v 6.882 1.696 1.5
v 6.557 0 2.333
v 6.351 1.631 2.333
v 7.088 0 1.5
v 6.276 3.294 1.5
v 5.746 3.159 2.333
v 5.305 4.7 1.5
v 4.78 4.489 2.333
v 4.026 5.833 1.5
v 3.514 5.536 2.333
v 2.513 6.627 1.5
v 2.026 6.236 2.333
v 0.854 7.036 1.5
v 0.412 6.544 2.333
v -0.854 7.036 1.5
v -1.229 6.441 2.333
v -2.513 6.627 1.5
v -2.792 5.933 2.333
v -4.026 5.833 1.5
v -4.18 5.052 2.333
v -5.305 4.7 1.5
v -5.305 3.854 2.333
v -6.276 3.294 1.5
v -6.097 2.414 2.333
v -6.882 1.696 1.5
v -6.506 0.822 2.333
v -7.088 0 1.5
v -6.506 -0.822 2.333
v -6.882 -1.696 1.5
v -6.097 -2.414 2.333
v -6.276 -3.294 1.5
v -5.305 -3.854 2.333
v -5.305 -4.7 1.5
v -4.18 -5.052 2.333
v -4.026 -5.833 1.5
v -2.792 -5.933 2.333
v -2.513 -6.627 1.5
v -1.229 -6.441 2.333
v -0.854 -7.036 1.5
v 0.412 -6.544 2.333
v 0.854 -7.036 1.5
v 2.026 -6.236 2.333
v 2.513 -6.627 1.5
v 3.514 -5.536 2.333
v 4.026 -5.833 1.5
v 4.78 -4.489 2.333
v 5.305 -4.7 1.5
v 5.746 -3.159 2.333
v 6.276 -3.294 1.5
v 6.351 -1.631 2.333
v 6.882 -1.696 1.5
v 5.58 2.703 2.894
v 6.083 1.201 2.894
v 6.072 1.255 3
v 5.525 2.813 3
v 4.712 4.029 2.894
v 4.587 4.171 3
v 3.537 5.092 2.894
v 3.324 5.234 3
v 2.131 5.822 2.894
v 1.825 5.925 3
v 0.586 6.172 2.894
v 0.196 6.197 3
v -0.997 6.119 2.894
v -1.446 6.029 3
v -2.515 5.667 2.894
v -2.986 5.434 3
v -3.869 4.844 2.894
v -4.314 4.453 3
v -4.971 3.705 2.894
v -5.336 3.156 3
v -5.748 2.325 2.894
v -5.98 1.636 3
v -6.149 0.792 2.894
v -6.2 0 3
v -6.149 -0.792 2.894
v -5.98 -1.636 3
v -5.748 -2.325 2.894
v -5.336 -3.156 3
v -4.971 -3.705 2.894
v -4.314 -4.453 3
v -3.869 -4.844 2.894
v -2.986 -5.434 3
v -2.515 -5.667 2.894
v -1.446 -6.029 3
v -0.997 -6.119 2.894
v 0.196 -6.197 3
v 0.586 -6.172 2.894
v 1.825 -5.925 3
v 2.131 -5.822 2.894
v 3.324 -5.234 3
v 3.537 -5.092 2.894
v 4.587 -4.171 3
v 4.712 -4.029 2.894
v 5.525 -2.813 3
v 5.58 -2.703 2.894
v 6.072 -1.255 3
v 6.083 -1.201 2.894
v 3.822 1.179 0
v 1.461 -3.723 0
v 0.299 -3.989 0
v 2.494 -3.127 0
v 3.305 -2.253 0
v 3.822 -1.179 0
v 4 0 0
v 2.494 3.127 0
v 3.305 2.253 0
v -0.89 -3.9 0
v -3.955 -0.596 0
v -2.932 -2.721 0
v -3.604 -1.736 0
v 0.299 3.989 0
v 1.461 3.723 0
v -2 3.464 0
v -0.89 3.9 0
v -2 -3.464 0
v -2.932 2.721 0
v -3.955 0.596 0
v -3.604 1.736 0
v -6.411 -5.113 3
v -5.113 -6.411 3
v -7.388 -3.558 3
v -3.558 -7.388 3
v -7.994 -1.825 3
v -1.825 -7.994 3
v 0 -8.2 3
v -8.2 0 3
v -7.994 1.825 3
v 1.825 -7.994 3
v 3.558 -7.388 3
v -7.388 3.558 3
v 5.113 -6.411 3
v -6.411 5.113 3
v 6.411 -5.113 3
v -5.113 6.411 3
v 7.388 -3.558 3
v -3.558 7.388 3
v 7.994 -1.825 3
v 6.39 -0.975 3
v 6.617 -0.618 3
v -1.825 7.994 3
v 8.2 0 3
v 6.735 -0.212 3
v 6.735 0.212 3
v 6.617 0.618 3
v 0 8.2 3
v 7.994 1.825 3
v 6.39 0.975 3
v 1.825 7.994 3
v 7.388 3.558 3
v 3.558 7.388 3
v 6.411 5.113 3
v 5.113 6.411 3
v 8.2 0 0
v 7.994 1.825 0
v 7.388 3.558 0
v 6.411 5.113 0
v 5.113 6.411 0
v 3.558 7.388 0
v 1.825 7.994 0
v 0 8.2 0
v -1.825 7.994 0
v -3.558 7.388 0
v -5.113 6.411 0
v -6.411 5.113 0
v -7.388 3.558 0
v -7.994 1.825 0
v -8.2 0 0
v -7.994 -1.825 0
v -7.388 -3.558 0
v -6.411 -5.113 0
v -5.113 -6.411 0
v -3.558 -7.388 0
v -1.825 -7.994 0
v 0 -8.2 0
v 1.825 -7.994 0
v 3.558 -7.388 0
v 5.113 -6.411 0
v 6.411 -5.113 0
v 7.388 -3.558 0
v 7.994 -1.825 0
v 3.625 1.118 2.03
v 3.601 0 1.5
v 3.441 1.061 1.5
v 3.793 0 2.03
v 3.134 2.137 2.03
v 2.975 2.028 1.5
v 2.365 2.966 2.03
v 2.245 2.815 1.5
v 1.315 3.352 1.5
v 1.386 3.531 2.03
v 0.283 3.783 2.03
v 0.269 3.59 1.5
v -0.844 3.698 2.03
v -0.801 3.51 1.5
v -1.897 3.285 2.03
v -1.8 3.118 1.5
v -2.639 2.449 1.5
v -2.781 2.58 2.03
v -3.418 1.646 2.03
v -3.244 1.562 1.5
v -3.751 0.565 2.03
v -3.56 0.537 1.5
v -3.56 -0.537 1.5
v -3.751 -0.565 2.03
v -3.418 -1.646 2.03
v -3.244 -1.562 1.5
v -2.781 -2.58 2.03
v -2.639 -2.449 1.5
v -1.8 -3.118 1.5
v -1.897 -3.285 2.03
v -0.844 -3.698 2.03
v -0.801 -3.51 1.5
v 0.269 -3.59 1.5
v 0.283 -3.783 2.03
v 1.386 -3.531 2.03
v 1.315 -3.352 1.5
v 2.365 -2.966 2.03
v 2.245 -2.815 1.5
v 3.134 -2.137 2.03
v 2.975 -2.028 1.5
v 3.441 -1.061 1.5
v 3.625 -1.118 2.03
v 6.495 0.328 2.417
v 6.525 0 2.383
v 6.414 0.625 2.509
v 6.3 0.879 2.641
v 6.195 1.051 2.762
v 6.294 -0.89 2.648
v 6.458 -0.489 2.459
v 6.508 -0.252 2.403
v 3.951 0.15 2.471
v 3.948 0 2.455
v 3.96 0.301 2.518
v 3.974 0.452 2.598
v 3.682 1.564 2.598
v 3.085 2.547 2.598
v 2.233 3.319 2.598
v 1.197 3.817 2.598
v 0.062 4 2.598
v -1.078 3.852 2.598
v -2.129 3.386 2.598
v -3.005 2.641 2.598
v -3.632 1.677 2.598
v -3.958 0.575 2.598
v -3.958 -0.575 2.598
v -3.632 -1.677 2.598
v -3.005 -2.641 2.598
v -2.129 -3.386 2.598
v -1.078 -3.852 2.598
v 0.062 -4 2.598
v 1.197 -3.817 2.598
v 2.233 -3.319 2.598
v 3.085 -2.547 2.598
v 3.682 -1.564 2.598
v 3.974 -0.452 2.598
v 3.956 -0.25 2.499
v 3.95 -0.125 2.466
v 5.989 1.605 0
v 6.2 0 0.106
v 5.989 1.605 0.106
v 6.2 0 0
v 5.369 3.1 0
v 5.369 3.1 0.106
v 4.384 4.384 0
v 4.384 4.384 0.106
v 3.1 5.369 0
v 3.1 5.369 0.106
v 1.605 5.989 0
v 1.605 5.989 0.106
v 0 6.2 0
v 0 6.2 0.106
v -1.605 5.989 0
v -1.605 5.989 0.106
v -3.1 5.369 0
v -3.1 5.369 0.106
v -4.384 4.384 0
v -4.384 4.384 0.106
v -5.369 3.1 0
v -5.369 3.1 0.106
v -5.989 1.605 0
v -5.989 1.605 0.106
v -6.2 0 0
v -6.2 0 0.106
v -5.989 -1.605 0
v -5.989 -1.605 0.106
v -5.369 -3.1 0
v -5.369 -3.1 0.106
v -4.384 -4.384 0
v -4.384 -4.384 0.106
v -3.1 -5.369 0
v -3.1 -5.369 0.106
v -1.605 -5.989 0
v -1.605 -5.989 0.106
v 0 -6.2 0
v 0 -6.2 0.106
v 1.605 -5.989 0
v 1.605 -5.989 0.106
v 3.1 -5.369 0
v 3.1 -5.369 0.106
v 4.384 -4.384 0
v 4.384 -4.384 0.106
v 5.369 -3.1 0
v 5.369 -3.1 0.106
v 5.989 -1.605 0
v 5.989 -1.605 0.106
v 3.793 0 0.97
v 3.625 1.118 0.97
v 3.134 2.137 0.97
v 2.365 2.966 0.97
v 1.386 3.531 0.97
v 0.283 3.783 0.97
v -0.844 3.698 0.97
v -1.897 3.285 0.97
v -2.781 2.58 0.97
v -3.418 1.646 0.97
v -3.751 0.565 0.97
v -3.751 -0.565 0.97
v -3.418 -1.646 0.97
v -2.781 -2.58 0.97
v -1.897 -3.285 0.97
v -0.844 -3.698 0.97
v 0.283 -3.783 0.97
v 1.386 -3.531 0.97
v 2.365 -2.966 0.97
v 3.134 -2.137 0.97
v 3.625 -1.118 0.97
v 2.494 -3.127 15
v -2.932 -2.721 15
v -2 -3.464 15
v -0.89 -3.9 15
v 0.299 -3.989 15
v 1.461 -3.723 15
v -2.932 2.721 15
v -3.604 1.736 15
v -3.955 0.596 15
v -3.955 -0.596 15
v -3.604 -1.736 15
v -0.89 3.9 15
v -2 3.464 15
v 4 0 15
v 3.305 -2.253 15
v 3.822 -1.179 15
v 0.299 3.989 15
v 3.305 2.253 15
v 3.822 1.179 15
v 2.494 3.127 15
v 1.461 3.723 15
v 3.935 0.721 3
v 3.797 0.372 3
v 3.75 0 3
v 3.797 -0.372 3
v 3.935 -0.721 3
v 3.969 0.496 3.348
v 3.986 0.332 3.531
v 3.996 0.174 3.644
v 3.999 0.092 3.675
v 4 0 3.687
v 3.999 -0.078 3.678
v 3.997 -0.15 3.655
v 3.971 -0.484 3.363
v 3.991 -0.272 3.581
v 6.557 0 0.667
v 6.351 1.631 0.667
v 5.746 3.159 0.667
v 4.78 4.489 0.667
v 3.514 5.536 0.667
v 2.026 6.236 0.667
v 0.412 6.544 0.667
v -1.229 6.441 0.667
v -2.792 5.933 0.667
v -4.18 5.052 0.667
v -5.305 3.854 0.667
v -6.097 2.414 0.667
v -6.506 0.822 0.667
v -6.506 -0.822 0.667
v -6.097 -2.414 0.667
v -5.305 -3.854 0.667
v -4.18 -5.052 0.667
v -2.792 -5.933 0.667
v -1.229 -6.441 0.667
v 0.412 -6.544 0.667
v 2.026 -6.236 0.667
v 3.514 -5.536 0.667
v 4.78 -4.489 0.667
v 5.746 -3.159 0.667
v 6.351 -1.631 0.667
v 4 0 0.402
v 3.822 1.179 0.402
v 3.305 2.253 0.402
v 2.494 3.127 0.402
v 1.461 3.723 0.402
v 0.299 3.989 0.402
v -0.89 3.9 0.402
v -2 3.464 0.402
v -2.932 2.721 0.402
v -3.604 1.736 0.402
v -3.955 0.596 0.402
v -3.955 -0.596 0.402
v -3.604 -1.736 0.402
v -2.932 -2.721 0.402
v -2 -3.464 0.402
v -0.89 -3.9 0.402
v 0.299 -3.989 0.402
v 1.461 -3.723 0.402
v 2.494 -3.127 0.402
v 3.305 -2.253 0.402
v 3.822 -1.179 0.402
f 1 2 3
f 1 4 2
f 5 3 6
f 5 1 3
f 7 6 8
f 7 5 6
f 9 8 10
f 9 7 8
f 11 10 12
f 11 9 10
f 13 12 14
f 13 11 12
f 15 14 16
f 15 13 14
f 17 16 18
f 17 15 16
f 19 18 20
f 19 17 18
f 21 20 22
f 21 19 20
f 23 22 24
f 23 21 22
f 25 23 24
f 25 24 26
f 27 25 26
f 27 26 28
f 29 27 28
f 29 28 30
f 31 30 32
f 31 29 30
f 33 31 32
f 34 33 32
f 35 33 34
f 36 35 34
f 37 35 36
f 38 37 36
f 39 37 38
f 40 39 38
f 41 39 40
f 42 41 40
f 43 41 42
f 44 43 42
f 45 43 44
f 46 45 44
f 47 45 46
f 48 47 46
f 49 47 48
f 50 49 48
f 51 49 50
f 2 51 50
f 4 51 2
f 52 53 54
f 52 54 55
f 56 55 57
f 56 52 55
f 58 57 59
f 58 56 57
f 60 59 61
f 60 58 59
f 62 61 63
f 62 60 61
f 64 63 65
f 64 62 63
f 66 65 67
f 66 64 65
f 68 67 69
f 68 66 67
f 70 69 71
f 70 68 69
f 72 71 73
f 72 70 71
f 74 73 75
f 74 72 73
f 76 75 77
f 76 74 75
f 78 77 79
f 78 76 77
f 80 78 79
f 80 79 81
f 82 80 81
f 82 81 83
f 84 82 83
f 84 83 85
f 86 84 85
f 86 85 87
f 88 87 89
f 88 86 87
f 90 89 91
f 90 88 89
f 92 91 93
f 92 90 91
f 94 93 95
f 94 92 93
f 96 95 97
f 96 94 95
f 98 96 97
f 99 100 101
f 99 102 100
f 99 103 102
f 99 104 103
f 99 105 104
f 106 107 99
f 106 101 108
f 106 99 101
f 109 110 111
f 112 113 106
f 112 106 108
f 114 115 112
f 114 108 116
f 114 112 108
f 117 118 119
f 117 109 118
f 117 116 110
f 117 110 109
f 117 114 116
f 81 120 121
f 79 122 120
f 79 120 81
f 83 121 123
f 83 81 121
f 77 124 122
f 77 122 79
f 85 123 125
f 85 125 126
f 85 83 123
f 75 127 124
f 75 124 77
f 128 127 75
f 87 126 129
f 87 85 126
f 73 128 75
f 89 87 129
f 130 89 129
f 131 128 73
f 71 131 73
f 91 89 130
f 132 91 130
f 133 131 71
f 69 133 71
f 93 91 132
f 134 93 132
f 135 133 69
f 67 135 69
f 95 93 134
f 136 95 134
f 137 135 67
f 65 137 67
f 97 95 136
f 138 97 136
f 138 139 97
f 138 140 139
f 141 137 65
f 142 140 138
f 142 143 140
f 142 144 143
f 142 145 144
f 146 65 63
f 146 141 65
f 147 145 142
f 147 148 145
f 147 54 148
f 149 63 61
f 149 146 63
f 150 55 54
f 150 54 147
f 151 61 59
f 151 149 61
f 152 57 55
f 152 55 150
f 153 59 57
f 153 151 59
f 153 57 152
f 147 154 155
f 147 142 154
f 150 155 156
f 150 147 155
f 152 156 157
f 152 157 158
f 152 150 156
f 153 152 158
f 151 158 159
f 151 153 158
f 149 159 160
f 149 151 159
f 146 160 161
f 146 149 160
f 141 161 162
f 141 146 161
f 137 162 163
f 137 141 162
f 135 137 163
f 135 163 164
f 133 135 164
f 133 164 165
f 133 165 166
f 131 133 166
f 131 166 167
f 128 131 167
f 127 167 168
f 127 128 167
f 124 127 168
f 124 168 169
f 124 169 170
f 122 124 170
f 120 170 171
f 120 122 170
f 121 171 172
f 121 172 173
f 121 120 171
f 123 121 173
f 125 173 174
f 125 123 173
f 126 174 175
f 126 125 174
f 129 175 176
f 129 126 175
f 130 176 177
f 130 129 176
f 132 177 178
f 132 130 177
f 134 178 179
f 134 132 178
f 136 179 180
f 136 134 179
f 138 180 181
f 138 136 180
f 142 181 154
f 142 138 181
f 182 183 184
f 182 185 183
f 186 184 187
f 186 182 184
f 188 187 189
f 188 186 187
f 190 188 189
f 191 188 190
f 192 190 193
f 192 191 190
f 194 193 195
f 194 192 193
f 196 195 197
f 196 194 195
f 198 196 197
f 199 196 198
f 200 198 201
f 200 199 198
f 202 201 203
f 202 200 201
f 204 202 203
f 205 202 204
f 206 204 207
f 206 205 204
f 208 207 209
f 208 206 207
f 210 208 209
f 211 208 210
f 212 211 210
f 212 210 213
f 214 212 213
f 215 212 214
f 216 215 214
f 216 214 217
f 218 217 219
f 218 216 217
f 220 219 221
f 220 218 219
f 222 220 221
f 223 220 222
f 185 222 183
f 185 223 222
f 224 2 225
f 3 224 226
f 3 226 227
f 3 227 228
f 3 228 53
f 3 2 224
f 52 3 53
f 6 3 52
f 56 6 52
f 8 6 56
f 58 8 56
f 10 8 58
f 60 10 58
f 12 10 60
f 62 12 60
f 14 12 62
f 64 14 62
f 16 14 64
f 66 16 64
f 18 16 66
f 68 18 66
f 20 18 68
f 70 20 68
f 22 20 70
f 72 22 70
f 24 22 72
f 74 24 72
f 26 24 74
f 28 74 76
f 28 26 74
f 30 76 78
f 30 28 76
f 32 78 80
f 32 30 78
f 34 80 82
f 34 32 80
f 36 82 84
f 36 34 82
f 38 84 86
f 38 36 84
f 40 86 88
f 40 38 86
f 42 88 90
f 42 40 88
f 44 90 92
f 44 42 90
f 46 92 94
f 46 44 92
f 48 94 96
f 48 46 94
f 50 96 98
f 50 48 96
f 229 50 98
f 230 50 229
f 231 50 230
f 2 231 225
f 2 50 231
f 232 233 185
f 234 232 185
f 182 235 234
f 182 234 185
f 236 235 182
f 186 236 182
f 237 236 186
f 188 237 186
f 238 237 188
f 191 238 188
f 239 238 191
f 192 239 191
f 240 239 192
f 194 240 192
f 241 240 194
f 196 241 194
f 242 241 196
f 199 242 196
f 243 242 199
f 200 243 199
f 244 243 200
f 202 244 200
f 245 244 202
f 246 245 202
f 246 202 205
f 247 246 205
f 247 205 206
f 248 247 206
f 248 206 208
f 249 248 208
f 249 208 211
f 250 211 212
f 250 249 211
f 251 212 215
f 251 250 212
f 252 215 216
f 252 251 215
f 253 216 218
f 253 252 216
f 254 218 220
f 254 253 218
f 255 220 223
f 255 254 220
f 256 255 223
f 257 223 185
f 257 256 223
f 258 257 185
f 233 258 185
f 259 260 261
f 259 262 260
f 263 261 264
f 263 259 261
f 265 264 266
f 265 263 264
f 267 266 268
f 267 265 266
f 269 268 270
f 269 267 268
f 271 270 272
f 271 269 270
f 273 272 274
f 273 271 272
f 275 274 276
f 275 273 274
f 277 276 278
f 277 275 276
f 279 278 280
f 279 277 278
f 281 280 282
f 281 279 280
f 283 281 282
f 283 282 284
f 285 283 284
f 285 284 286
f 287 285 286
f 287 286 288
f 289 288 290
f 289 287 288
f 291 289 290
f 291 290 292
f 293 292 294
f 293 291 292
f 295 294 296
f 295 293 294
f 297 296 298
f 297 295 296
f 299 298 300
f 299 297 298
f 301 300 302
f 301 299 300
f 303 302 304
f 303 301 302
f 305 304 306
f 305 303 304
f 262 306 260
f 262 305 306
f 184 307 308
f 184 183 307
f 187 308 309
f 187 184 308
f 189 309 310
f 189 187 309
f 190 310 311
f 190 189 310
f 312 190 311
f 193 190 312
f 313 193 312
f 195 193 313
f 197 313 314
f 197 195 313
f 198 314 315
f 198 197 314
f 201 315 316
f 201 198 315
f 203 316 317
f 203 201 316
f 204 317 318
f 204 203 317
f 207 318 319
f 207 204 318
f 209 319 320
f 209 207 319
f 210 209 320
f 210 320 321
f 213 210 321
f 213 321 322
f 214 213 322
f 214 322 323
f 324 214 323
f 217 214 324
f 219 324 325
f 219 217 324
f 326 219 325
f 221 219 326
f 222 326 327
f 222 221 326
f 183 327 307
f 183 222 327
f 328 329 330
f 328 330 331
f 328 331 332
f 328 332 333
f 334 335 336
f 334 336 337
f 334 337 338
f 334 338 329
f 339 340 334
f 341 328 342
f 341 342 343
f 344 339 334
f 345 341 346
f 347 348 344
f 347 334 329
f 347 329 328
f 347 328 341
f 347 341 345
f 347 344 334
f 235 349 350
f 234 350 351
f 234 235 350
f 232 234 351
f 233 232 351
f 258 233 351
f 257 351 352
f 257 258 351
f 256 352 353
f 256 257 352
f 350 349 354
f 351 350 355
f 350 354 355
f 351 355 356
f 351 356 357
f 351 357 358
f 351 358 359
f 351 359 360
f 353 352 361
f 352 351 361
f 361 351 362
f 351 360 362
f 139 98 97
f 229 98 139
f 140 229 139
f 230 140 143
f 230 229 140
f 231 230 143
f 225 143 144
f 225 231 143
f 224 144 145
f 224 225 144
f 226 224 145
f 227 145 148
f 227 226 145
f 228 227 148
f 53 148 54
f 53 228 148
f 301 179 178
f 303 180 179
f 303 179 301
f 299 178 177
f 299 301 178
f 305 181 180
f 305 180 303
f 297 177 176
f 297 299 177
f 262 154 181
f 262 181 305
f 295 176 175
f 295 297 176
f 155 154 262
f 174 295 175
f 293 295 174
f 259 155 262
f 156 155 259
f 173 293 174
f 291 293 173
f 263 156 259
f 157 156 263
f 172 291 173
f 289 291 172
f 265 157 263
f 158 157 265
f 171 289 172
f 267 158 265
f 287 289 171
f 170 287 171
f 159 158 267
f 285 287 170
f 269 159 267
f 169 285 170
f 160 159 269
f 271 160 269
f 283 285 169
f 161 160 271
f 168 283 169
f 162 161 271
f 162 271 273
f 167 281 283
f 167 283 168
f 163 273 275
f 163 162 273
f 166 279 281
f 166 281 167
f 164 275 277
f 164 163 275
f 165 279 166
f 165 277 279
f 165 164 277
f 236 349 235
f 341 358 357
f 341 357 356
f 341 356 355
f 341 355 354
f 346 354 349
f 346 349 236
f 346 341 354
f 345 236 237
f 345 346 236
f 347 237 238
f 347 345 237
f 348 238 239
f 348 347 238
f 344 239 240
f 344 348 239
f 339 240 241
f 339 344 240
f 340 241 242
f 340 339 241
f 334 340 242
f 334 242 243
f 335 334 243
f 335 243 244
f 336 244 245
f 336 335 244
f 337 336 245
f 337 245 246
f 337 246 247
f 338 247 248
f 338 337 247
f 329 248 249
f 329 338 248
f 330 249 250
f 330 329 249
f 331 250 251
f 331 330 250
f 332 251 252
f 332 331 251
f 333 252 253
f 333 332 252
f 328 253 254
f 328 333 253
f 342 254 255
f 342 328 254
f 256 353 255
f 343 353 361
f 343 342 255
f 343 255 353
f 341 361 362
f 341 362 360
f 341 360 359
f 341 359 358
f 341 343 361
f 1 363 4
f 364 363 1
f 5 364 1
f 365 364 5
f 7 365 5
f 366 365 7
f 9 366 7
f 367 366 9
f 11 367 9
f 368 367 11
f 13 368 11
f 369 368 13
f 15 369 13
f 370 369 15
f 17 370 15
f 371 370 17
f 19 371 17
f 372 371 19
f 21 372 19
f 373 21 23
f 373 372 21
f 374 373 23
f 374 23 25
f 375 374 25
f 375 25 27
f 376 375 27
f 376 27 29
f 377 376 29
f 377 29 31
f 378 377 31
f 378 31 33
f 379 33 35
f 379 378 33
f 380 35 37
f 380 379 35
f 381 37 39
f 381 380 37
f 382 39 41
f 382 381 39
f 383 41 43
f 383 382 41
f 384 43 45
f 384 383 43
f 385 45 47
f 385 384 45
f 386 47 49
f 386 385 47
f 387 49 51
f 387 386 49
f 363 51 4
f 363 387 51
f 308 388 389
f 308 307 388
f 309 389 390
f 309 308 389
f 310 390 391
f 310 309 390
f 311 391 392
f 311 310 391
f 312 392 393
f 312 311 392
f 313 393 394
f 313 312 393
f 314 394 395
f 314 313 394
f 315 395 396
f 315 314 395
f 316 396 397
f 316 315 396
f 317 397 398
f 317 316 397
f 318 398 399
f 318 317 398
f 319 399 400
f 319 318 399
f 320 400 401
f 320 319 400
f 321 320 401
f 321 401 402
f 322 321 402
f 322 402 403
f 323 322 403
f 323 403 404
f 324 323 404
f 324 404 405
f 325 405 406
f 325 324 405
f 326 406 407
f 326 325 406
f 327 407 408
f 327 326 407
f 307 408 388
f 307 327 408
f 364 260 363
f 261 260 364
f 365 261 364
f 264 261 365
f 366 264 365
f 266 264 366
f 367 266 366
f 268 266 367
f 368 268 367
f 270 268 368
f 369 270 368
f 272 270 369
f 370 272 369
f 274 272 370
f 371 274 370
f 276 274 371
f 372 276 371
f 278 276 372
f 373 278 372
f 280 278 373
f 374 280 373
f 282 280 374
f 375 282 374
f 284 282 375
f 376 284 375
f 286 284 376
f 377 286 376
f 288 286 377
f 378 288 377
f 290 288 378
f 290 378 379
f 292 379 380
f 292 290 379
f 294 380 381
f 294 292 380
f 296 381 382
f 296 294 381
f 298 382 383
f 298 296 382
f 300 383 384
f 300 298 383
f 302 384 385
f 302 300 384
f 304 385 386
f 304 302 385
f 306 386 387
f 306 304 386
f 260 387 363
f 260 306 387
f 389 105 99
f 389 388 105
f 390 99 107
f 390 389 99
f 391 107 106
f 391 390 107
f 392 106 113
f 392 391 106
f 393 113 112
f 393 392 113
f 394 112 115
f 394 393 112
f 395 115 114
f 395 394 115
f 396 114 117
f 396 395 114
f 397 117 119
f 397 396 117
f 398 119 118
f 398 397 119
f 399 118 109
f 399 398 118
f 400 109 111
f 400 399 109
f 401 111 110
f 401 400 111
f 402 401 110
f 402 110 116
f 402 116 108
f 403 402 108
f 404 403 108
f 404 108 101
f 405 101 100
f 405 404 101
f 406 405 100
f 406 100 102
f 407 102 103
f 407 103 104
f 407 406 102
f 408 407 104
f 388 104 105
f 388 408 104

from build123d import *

# Parameters (mm, degrees)
F2_R     = 1.5
F3_DEPTH = 1.5
F3_TAPER = 20


with BuildPart() as f1:
    # F0 (on Front) → F1 (revolve)
    with BuildSketch(Plane.XZ):
        Polygon((0, 15), (0, 0), (4, 0), (4, 0.4024499541), (3.7934764173, 0.9698688341), (3.6005244527, 1.5), (3.7934764478, 2.0301312496), (4, 2.5975500459), (4, 15), align=None)
    revolve(axis=Axis((0, 0, 7.5), (0, 0, 1)))


with BuildPart() as f1b:
    # F0 (on Front) → F1, piece 2 (revolve)
    with BuildSketch(Plane.XZ):
        Polygon((6.5572567367, 0.6671856002), (6.2, 0.1064048534), (6.2, 0), (8.2, 0), (8.2, 3), (6.2, 3), (6.2, 2.8935951466), (6.5572567677, 2.3328143511), (7.0878180235, 1.5), align=None)
    revolve(axis=Axis((0, 0, 7.5), (0, 0, 1)))


with BuildPart() as f3_tool:
    # F2 (on face) → F3 (new body, symmetric)
    with BuildSketch(Plane.XY.offset(3)):
        with Locations((5.25, 0)):
            Circle(F2_R)
    extrude(amount=F3_DEPTH, both=True, taper=F3_TAPER)


with BuildPart() as f1_1:
    add(f1.part)

    # F3: cut by f3_tool
    add(f3_tool.part, mode=Mode.SUBTRACT)


with BuildPart() as f1b_1:
    add(f1b.part)

    # F3: cut by f3_tool
    add(f3_tool.part, mode=Mode.SUBTRACT)


solid = Compound([f1_1.part, f1b_1.part])
